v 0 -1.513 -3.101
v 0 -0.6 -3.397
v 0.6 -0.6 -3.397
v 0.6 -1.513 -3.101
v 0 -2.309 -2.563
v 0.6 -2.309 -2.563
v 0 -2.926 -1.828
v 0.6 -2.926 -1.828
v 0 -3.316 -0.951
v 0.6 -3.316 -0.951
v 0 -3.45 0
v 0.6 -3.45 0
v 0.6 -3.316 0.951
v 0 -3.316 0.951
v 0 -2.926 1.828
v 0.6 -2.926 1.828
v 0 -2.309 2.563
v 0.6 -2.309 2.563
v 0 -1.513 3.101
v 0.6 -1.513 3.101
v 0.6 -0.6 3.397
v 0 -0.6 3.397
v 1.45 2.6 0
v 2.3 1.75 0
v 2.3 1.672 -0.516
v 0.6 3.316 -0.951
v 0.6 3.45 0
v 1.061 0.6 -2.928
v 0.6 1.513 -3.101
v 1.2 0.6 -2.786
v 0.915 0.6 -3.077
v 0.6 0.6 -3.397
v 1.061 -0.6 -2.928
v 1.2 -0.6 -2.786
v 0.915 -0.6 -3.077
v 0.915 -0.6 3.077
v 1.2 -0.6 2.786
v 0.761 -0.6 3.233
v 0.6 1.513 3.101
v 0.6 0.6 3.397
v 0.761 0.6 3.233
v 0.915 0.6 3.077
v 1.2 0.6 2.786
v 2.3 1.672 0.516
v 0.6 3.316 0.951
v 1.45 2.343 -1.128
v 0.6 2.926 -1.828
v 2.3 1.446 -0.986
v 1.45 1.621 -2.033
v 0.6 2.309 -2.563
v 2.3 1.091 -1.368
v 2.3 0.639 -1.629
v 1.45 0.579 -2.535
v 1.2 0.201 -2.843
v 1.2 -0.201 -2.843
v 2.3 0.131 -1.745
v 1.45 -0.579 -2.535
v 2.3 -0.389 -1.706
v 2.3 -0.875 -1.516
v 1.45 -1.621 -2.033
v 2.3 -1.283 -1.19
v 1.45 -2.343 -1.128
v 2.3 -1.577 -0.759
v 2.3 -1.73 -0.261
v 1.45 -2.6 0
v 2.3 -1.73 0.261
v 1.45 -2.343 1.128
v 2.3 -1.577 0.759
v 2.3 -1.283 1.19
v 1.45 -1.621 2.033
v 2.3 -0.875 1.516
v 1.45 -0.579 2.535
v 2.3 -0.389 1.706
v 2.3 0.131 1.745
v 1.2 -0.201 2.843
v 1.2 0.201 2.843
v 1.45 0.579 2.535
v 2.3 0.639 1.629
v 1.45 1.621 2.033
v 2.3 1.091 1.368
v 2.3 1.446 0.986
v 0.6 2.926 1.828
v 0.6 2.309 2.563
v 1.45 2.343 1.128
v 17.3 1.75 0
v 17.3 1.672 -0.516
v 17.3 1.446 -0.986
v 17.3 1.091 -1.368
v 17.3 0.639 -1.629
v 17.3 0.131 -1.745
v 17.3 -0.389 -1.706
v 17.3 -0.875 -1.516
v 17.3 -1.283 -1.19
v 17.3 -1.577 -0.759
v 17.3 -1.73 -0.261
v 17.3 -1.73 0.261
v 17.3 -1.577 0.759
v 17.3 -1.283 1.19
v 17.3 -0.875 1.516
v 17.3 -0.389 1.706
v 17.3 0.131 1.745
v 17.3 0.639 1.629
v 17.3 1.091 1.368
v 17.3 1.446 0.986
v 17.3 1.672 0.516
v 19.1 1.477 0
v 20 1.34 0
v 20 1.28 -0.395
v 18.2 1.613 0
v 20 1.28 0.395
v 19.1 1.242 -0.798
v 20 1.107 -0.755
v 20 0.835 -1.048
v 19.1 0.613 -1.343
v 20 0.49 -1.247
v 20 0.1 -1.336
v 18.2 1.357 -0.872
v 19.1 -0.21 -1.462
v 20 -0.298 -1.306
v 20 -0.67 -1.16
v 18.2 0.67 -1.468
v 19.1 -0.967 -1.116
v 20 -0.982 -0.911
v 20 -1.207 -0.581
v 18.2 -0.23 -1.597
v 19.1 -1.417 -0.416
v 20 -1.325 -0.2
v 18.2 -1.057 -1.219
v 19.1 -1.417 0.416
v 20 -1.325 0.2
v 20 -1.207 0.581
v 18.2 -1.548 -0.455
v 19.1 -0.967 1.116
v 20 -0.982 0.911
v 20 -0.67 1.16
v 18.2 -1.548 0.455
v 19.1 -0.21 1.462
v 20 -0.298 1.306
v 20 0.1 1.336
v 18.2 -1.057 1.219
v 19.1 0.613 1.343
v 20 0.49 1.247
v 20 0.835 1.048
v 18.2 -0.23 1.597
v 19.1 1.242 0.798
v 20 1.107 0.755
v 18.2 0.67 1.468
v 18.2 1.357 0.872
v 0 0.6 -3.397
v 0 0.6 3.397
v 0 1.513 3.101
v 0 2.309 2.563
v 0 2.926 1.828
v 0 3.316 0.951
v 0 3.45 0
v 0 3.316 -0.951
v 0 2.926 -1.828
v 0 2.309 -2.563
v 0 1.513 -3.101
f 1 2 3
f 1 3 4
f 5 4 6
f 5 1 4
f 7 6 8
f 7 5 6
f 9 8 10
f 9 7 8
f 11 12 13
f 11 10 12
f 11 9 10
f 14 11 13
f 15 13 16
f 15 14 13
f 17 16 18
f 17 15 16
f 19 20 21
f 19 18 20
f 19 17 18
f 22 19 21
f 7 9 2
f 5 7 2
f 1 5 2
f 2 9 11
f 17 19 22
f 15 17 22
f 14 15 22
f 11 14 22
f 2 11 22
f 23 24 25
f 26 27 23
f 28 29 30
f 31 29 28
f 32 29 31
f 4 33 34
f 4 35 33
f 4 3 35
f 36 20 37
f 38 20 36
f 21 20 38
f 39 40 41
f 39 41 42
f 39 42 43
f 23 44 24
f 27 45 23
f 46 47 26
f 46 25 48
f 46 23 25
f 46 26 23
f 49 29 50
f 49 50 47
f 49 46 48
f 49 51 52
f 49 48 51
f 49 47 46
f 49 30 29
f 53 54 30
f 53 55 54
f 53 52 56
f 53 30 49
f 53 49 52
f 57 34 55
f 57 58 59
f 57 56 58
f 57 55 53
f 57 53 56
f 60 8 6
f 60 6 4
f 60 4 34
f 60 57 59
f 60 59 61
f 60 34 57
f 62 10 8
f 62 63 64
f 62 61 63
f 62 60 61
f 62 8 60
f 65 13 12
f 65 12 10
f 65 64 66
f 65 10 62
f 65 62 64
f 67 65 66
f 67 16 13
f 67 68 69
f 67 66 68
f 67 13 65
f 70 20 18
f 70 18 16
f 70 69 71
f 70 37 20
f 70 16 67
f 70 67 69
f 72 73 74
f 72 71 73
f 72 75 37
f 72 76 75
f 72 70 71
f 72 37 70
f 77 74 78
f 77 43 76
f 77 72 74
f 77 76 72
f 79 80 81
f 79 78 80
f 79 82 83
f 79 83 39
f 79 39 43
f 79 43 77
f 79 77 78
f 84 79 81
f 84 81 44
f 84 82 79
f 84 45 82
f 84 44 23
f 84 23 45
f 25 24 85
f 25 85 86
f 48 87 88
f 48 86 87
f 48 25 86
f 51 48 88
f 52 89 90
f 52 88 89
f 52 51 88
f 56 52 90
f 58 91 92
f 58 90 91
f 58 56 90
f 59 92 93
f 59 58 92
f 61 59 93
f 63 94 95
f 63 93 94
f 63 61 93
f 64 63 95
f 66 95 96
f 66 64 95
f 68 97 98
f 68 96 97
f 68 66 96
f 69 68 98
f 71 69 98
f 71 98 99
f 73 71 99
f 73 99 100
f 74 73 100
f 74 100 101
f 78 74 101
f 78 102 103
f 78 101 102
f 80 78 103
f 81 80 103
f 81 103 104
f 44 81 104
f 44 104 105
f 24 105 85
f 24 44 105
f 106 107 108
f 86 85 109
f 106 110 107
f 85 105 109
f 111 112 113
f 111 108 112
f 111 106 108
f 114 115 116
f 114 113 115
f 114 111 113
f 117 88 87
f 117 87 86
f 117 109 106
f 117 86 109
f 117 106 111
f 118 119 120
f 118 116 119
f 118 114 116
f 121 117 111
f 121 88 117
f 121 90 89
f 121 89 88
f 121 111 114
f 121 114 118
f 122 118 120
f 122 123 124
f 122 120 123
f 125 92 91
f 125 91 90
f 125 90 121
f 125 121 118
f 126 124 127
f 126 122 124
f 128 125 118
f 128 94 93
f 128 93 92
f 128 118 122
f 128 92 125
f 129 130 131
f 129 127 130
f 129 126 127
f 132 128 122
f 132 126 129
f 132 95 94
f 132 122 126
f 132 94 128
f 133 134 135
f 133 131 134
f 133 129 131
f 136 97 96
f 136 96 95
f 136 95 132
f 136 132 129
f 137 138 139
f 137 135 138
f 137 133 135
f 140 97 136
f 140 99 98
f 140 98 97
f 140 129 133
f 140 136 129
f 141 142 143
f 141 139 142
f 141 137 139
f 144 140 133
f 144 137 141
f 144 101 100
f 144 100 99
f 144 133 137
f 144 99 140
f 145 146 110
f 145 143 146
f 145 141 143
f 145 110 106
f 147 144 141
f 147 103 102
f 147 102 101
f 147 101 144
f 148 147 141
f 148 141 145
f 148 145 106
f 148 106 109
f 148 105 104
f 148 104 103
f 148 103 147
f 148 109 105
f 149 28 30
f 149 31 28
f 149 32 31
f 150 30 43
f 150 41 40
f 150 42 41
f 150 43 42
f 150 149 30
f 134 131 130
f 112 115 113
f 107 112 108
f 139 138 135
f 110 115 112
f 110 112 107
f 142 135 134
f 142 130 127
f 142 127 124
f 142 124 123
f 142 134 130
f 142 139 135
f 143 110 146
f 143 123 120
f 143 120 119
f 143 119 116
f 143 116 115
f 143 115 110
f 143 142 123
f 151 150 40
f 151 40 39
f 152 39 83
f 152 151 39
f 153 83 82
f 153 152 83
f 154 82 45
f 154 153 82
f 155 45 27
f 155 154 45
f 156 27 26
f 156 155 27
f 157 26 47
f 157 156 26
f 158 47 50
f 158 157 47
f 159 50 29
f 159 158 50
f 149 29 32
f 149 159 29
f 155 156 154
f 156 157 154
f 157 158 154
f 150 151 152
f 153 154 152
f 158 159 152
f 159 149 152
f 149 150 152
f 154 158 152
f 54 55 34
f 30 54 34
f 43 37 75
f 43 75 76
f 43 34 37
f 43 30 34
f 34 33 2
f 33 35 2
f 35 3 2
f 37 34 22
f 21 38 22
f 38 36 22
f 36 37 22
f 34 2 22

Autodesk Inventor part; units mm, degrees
ref_plane "YZ Plane" through (0, 0, 0) normal (1, 0, 0) x (0, 1, 0)
ref_plane "XZ Plane" through (0, 0, 0) normal (0, 1, 0) x (-1, 0, 0)
sketch "Sketch1" plane through (0, 0, 0) normal (0, 0, 1) x (1, 0, 0)
  line L0 (-4, 0) -> (24, 0) projected
  line L1 (0, 0) -> (20, 0)
  line L2 (20, 0) -> (20, 1.75)
  line L3 (20, 1.75) -> (2.3, 1.75)
  line L4 (2.3, 1.75) -> (2.3, 1.75)
  line L5 (2.3, 1.75) -> (0.6, 3.45)
  line L6 (0.6, 3.45) -> (0, 3.45)
  line L7 (0, 3.45) -> (0, 0)
  line L8 (0, -0.69) -> (0, 4.14) projected
  dimension "d0" = 20
  dimension "d1" = 2.3
  dimension "d2" = 3.5
  dimension "d3" = 3.5
  dimension "d4" = 6.9
  dimension "d5" = 45
revolve "Body" add sketch "Sketch1" angle 360 about axis through (0, 0, 0) along (1, 0, 0)
sketch "Sketch2" plane through (0, 0, 0) normal (-1, 0, 0) x (0, 0, 1)
  circle A0 centre (0, 0) radius 3.45 projected
  line L0 (-4.83, 0) -> (4.83, 0) projected
  line L1 (-3.45, 0) -> (-3.45, 0.6)
  line L2 (-3.45, 0.6) -> (3.45, 0.6)
  line L3 (3.45, 0) -> (3.45, 0.6)
  line L4 (-3.45, 0) -> (-3.45, -0.6)
  line L5 (-3.45, -0.6) -> (3.45, -0.6)
  line L6 (3.45, 0) -> (3.45, -0.6)
  dimension "d8" = 1.2
extrude "Slot" cut sketch "Sketch2" against normal blind 1.2 contours L0 A0 L2 | L6 L5 A0 | A0 L5 L0 | A0 L2 L3 | L1 L2 A0 | A0 L5 L4
thread "Thread" size "M3.5x0.6" class "6g" standard "ISO Metric profile" length 17.7
chamfer "Chamfer1" distance 0.41 distance2 2.7 1 edges at (20, -1.75, 0) measured on face at (20, 0.4611, 1.0065)
ref_plane "Work Plane1" through (2.2553, 0, 0) normal (0, 0, -1) x (1, 0, 0)
equation "\"d8\" = SBR"
equation "\"d9\" = STI"
equation "\"d0\" = NLG"
equation "\"d1\" = KOH"
equation "\"d2\" = NND"
equation "\"d3\" = SED2"
equation "\"d4\" = KOD"
equation "\"d5\" = 0.5 * SEWI"
equation "\"d6\" = GEL"
equation "\"d14\" = -0.5 * GD2 + 0.5 * NND"
equation "\"d15\" = SPTZ"
equation "\"NND\" = 3.5"
equation "\"NLG\" = 20"
equation "\"GEL\" = 17.7"
equation "\"KOH\" = 2.3"
equation "\"KOD\" = 6.9"
equation "\"SBR\" = 1.2"
equation "\"STI\" = 1.2"
equation "\"GD2\" = 2.68"
equation "\"SED2\" = 3.5"
equation "\"SEWI\" = 90deg"
equation "\"SPTZ\" = 2.7"
equation "\"GUL\" = 0.61345 * PTC"
equation "\"THREADDIA\" = 3.5"
equation "\"TOA\" = 30deg"
equation "\"PTC\" = 0.6"
equation "\"GAL\" = 0.61345 * PTC"
equation "\"GD1\" = THREADDIA - 1.2269 * PTC"
properties part number "ANSI/ASME B18.6.5M - M3.5x0.6 x 20, SFCHTSTTM" material "Steel, Mild"
